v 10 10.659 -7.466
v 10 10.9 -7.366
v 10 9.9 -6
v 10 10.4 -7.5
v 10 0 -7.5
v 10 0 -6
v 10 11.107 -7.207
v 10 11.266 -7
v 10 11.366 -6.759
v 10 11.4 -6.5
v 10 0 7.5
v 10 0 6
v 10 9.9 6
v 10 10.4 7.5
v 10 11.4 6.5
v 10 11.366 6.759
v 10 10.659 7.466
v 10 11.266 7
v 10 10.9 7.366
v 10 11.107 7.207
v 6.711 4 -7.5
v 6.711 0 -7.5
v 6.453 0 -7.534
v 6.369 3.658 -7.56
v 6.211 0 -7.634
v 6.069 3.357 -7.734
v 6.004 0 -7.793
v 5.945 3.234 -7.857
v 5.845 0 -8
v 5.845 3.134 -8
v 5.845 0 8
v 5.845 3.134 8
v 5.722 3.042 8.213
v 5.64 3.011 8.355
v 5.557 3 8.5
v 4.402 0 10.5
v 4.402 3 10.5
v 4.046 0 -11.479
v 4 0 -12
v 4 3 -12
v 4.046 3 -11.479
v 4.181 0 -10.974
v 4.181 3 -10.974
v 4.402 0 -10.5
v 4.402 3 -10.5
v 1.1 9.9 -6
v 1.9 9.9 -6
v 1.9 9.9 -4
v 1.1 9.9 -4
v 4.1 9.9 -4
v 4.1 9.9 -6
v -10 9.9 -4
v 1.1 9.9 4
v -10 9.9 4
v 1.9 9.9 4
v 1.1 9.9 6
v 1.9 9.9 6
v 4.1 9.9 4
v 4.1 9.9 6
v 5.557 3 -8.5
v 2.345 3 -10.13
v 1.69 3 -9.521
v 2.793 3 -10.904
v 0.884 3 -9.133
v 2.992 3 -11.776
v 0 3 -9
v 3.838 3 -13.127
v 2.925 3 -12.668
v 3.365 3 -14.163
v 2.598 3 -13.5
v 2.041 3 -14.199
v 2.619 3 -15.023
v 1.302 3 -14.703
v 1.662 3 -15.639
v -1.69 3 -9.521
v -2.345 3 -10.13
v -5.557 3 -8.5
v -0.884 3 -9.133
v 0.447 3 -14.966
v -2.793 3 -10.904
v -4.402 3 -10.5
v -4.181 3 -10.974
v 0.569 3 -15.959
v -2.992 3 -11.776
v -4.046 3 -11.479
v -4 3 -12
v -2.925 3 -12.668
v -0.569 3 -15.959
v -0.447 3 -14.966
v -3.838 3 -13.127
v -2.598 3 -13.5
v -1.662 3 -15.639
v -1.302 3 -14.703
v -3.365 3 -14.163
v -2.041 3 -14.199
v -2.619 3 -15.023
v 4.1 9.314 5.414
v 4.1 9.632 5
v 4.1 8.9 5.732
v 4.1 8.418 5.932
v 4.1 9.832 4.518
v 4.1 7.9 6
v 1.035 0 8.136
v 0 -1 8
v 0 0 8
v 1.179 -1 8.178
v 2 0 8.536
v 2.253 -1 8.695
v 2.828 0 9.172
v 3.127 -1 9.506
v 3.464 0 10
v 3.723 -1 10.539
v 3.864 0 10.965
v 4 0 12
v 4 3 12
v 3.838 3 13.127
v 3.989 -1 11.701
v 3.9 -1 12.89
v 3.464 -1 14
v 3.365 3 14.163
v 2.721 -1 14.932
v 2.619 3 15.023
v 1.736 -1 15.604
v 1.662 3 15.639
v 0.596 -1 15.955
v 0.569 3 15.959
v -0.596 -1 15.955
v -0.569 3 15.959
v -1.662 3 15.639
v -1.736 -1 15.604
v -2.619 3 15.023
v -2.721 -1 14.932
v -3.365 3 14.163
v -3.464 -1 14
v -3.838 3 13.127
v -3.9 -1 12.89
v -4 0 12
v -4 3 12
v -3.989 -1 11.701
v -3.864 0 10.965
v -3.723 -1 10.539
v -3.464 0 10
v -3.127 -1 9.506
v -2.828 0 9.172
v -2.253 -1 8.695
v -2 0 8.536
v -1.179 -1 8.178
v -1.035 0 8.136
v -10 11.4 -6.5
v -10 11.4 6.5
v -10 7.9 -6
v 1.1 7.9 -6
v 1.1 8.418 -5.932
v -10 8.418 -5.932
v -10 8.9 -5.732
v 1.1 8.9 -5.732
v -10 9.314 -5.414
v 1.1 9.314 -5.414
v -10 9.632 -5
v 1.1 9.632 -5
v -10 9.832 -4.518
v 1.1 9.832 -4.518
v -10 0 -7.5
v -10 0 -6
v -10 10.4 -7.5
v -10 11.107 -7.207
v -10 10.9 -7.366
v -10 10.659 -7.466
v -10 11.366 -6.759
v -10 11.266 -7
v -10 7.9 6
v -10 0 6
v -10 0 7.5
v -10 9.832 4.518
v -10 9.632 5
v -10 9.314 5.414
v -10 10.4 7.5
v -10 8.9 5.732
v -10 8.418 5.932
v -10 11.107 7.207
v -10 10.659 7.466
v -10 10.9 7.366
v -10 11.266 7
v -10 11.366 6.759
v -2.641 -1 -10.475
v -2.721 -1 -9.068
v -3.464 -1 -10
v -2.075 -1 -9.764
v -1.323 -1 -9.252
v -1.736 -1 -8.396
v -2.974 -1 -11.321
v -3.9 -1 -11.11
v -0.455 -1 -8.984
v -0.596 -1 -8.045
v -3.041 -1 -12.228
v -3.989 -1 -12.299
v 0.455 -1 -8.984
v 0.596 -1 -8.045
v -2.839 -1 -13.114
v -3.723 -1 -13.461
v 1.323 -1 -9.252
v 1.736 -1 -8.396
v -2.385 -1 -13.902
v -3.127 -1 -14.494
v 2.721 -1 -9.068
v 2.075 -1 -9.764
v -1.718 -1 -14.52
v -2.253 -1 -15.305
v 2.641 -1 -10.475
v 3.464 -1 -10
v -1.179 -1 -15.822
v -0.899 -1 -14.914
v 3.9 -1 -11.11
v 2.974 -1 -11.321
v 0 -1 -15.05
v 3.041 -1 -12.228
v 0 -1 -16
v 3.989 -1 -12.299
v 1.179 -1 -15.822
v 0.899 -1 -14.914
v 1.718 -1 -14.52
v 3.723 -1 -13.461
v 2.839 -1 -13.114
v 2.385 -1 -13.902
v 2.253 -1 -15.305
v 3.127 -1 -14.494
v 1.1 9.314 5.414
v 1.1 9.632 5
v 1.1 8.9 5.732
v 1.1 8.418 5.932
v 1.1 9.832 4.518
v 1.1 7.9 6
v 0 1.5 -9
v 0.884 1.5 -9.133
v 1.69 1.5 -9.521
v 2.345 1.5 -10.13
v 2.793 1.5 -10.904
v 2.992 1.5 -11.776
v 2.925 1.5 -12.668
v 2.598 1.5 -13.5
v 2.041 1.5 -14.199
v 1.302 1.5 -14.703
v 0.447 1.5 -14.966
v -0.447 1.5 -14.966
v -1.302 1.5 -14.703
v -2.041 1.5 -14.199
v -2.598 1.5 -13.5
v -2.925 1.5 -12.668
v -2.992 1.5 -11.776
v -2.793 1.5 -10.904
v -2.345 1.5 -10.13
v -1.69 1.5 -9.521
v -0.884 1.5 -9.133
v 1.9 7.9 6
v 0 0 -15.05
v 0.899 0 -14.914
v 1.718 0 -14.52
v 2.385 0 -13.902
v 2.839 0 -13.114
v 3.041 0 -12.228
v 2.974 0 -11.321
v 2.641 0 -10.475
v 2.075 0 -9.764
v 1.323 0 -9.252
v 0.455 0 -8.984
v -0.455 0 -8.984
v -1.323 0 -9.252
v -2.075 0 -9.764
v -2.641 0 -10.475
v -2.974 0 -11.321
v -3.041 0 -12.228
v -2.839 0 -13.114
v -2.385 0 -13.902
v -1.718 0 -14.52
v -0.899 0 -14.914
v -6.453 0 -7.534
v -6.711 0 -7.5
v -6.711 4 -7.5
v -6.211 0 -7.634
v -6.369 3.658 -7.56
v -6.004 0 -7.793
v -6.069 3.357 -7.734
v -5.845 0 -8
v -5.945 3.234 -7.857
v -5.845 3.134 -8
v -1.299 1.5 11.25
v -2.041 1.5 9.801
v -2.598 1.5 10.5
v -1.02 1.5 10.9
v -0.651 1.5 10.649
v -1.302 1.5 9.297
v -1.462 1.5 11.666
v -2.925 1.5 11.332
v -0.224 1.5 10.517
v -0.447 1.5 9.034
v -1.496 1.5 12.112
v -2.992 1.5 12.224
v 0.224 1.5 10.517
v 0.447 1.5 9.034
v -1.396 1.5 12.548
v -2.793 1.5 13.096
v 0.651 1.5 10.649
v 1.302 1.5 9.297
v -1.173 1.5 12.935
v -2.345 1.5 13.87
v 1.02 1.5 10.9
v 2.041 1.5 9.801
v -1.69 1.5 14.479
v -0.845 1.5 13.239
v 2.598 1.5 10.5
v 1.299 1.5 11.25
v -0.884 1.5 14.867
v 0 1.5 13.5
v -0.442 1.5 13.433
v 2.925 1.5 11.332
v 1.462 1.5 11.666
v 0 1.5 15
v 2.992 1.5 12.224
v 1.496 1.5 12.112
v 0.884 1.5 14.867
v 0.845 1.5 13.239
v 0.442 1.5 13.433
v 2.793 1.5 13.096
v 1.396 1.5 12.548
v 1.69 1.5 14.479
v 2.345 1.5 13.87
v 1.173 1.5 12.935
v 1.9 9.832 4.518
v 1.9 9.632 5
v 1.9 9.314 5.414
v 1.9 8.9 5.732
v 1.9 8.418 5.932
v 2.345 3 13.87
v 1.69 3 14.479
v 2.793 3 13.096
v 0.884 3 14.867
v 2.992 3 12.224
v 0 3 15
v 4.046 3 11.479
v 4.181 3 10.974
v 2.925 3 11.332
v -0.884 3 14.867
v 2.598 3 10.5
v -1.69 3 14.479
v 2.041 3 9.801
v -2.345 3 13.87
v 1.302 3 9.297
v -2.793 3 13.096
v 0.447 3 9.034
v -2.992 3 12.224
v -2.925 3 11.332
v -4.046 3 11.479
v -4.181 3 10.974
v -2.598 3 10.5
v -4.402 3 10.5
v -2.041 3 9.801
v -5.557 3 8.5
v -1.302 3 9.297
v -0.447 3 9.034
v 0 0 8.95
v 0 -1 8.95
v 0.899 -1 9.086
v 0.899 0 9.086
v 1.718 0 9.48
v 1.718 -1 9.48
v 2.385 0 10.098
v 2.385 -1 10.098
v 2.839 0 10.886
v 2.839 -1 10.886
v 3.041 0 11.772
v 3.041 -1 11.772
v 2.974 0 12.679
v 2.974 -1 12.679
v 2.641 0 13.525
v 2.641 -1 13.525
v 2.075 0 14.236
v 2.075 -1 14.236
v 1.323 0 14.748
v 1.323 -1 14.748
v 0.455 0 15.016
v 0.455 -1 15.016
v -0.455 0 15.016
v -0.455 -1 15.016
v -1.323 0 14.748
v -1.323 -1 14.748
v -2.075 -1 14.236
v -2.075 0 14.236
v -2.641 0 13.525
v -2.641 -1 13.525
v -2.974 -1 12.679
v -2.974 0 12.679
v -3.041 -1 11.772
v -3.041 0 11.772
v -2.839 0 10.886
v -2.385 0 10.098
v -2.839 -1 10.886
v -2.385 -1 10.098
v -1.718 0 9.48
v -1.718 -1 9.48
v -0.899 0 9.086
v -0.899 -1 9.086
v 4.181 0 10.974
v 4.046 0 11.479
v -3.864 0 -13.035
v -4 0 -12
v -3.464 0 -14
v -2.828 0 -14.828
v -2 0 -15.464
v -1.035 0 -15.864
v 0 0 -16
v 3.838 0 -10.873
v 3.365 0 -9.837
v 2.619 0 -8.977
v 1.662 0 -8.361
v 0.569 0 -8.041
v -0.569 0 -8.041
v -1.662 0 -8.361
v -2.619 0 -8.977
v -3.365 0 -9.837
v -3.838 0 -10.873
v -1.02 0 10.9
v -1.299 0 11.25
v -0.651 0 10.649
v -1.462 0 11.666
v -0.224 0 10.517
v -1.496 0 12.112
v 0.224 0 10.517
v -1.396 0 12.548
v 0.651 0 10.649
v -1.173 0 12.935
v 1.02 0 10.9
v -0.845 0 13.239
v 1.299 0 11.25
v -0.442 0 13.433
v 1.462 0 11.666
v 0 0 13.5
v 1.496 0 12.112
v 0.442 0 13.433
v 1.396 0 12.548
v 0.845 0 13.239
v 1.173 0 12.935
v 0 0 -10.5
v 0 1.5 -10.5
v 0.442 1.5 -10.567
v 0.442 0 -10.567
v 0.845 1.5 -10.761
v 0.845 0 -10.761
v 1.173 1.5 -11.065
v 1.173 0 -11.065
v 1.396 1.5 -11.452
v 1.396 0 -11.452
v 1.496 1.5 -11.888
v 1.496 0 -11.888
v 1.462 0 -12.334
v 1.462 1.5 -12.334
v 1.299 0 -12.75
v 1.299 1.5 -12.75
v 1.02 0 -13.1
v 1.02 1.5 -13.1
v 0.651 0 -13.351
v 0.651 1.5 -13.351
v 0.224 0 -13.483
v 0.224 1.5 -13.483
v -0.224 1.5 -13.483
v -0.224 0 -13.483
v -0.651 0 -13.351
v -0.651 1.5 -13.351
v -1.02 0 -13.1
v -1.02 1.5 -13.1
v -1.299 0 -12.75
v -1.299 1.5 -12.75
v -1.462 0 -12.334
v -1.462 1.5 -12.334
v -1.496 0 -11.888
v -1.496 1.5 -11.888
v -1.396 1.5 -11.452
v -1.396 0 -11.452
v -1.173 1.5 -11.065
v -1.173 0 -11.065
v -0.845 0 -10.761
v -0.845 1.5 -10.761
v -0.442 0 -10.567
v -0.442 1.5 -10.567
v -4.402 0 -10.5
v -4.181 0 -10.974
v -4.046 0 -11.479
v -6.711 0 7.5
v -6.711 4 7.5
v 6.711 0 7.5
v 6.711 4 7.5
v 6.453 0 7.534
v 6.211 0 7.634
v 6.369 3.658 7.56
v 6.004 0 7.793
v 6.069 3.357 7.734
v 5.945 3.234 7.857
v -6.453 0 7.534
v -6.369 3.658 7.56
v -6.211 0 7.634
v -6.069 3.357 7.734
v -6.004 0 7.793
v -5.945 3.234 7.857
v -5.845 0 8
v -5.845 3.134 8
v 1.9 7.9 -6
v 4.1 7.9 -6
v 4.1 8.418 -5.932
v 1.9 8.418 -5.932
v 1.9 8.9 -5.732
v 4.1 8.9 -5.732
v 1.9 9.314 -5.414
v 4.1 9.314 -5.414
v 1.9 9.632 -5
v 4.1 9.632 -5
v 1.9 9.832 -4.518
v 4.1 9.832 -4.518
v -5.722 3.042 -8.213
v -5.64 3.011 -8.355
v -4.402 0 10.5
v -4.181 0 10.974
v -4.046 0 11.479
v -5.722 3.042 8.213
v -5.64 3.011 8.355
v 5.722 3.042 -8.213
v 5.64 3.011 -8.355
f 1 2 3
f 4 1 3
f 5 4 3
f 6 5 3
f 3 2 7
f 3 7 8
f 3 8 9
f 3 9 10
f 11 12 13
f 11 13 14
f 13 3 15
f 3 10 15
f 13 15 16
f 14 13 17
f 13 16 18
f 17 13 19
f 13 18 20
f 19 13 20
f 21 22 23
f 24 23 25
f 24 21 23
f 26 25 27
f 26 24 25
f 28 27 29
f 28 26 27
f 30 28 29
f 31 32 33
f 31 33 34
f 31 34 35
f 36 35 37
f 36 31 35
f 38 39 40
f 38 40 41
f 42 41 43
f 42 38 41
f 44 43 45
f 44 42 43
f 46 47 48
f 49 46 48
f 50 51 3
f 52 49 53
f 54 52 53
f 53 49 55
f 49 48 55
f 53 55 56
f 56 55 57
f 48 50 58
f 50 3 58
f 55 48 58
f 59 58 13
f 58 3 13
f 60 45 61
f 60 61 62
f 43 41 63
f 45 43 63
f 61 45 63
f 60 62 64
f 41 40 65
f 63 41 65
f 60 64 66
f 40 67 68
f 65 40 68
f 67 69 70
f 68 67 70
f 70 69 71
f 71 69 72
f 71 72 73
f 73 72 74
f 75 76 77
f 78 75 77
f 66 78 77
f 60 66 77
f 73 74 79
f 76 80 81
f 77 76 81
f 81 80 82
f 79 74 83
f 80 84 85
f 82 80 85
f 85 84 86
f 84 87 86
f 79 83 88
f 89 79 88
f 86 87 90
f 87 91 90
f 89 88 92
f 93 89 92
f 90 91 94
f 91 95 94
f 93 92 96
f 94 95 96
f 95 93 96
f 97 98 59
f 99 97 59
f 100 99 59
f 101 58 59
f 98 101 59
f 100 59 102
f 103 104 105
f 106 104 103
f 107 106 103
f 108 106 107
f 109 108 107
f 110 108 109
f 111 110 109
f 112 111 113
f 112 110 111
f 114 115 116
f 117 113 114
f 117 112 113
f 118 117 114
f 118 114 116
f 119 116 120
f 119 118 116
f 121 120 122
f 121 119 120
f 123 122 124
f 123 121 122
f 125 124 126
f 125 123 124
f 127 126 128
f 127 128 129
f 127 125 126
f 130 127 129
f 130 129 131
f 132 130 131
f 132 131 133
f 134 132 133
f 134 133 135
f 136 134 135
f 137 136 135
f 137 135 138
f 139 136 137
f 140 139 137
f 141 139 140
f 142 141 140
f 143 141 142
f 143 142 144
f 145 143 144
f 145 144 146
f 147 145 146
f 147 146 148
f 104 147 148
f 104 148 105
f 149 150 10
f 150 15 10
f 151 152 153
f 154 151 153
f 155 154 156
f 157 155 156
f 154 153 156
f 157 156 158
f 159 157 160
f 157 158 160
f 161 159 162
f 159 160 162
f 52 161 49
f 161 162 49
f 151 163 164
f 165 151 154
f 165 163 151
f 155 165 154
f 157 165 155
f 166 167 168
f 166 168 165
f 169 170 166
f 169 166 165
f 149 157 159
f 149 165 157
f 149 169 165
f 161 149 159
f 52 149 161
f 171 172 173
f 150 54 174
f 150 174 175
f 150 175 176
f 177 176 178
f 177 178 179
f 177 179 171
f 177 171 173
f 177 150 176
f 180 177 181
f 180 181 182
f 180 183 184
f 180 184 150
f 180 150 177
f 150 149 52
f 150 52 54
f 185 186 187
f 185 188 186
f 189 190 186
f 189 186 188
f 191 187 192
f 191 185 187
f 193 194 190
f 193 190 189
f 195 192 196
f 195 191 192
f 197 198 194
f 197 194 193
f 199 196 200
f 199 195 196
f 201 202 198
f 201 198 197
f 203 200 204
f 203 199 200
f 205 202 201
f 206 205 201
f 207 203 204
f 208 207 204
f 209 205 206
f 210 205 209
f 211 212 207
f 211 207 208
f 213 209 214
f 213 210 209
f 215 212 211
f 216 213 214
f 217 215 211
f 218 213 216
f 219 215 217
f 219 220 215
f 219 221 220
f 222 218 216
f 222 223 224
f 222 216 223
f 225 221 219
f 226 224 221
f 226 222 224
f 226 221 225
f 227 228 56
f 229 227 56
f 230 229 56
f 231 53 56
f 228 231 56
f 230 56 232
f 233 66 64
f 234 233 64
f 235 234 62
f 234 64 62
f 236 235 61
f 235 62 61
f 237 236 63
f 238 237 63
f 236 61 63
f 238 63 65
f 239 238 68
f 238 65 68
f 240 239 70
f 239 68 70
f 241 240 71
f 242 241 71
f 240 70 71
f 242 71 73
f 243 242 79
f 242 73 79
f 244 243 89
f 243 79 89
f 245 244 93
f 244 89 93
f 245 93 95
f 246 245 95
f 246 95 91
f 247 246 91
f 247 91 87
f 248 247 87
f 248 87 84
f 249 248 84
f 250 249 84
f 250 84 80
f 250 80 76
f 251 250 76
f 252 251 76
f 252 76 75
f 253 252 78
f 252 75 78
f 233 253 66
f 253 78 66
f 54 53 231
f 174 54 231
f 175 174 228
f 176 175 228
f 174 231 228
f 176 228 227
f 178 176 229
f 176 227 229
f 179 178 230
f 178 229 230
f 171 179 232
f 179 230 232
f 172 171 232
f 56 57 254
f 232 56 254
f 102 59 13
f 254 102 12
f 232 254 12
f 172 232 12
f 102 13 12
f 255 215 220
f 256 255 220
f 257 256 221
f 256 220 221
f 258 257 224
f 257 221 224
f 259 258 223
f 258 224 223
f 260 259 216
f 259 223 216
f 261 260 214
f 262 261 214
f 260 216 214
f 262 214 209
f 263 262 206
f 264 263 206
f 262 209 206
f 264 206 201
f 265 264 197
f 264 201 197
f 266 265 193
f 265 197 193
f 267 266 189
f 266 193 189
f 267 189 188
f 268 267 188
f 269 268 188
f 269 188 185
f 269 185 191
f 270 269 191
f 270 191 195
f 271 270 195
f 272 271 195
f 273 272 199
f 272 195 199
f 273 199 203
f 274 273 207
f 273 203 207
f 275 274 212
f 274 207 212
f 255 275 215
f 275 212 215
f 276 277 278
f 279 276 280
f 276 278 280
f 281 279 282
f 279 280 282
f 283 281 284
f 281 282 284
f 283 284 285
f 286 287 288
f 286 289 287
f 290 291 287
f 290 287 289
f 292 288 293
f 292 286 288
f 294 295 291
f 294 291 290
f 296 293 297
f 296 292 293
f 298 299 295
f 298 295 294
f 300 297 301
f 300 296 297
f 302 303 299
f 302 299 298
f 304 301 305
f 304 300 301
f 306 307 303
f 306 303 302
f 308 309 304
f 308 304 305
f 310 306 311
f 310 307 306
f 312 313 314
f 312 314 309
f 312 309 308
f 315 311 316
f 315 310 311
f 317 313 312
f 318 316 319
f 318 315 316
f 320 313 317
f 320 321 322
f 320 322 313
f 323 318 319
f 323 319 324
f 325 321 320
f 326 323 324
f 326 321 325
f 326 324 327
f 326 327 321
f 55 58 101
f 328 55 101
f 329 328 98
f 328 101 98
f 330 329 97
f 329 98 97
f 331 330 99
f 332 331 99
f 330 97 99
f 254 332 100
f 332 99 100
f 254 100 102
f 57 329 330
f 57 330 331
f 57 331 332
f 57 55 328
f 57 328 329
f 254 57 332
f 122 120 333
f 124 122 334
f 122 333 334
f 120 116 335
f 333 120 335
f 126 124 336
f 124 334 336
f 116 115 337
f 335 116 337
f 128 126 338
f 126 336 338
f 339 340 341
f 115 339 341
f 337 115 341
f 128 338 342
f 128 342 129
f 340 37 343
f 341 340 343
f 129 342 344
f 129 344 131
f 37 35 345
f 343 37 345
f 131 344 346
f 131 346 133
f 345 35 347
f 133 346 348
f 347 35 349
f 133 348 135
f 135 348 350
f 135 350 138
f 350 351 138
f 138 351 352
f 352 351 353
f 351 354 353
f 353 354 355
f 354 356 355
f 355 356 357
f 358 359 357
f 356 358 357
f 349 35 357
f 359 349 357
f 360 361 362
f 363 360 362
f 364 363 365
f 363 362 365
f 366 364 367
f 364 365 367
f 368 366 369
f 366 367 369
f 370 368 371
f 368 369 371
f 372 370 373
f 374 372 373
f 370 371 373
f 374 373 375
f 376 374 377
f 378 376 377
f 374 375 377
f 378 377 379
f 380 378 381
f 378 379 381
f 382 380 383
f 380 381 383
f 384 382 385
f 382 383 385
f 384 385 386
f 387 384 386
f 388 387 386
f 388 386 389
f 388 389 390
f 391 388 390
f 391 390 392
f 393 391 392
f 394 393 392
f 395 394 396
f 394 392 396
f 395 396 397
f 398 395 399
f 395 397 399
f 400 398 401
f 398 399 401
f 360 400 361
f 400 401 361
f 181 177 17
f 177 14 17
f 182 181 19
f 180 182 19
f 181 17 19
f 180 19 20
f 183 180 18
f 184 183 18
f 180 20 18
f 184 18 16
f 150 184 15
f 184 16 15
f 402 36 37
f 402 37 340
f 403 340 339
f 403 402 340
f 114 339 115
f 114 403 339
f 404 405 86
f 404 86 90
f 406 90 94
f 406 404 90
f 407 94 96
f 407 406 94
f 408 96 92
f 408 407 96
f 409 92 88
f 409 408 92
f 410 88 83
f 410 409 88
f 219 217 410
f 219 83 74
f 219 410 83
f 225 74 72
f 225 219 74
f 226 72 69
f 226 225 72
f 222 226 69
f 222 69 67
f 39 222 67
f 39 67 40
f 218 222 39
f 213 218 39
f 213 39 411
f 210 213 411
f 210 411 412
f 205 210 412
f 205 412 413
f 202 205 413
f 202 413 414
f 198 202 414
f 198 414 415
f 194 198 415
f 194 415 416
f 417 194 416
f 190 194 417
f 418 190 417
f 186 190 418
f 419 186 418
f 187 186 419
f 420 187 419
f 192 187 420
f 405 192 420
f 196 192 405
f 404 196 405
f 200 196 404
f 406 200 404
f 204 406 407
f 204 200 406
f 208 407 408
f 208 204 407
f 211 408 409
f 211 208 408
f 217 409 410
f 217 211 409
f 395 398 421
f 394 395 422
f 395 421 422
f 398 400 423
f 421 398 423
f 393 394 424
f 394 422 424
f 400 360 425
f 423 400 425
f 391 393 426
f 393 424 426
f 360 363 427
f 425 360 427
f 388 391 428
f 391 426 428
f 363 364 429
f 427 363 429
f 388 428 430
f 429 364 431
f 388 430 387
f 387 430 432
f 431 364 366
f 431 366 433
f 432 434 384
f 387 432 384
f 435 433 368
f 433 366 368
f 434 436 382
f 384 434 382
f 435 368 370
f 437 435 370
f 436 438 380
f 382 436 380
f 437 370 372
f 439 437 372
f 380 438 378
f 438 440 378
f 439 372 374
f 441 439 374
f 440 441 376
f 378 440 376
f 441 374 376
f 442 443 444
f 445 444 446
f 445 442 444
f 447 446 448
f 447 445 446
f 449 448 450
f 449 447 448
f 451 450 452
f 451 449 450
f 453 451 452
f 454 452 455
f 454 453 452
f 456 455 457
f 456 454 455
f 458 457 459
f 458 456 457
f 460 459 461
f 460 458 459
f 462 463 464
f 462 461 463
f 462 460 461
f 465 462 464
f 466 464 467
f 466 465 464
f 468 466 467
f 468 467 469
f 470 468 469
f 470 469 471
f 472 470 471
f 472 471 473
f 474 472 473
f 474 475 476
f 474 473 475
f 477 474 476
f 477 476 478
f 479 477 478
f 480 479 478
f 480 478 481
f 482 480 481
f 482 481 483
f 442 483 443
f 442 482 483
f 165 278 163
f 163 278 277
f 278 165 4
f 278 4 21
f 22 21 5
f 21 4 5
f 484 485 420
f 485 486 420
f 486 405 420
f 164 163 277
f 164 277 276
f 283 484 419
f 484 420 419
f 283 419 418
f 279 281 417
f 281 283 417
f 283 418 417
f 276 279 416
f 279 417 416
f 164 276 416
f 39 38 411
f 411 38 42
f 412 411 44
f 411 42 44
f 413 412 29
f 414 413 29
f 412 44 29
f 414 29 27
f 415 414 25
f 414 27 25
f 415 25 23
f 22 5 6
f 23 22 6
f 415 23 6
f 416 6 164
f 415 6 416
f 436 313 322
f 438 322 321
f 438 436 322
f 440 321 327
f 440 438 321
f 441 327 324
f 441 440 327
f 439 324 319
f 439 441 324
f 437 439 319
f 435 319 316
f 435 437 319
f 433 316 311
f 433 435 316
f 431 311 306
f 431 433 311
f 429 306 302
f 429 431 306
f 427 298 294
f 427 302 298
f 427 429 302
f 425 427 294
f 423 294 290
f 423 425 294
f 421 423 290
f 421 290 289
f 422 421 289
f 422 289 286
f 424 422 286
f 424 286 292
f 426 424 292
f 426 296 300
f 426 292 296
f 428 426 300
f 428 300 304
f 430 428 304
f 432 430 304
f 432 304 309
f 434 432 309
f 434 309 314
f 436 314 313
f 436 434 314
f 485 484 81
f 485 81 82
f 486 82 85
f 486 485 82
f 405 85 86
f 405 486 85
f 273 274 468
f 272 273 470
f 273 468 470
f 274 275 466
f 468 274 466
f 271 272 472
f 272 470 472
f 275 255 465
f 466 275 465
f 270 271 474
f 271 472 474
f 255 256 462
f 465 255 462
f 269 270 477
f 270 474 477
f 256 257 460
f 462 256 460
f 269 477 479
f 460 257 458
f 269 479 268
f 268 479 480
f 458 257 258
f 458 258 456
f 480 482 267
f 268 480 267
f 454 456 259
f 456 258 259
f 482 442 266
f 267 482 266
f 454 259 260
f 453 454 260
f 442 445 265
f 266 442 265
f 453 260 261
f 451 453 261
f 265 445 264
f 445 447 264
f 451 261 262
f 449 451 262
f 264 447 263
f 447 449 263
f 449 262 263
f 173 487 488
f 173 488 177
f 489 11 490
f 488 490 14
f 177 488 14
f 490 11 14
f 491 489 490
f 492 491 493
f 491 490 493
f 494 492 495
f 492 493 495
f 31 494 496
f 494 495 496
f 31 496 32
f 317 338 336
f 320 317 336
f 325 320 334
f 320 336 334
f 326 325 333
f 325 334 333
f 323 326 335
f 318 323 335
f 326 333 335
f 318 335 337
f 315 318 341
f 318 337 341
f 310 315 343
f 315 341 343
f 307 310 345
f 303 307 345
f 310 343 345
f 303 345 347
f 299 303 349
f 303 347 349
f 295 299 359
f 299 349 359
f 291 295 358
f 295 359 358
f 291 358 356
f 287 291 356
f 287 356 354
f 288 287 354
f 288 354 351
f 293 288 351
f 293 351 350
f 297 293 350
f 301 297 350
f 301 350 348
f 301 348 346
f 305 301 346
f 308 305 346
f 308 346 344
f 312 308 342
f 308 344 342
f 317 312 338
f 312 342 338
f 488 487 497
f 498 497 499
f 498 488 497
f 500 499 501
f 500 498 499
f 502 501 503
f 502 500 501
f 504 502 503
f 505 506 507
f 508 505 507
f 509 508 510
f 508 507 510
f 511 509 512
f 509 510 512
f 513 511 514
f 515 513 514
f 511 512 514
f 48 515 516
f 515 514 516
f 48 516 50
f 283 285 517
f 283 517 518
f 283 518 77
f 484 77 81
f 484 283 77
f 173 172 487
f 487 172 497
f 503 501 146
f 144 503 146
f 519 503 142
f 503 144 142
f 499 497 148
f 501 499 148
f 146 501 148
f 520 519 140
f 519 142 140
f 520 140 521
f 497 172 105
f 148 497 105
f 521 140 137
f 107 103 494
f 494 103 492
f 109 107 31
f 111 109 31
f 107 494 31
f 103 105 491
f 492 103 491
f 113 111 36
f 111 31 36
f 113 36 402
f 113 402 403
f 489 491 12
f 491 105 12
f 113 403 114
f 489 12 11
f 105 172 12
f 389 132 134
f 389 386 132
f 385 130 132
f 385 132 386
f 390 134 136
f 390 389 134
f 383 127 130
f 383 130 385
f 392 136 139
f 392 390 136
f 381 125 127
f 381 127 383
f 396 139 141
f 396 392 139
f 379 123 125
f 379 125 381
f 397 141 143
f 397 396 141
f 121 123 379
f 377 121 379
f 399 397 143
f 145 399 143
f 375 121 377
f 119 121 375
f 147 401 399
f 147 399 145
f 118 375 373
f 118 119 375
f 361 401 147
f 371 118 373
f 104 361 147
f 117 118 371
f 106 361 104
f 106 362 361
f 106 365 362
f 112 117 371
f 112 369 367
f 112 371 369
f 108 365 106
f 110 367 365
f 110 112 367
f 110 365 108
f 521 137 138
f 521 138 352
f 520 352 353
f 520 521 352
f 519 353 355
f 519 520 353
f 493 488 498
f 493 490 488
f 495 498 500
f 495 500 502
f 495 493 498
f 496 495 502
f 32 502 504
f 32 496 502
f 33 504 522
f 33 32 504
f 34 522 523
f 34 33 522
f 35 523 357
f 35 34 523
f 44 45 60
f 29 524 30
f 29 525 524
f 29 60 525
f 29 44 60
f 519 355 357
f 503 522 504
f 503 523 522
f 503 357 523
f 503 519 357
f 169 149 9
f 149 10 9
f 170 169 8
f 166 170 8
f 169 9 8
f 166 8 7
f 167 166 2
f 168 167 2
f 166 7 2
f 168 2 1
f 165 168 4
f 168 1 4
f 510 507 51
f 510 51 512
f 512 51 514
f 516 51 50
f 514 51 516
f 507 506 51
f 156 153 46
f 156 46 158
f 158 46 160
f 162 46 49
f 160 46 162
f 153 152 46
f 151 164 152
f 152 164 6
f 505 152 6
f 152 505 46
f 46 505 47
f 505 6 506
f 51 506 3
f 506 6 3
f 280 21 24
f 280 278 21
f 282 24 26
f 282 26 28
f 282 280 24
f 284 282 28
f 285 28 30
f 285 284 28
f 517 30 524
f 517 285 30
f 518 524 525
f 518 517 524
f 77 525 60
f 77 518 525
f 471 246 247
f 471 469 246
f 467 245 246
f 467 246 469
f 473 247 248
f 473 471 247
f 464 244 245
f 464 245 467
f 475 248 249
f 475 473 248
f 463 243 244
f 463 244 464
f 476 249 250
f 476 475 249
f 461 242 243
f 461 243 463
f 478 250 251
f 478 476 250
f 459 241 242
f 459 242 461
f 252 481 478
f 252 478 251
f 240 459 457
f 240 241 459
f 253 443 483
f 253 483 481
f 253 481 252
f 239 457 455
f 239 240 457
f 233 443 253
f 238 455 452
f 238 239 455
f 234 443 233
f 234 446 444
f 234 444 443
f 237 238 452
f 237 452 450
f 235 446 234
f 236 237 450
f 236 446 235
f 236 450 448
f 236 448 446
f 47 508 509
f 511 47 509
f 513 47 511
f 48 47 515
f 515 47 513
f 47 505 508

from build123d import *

# Parameters (mm, degrees)
BOSS_EXTRUDE1_DEPTH = 10
SKETCH2_W           = 0.8
SKETCH2_H           = 12
CUT_EXTRUDE1_DEPTH  = 10
SKETCH3_R           = 1.5
BOSS_EXTRUDE2_DEPTH = 3
FILLET1_R           = 1
SKETCH4_R           = 3
CUT_EXTRUDE2_DEPTH  = 1.5
BOSS_EXTRUDE3_START = 1
SKETCH6_R           = 4
SKETCH6_R_2         = 3.05
BOSS_EXTRUDE3_DEPTH = 1


with BuildPart() as part:
    # Sketch1 → Boss-Extrude1 (new, symmetric)
    with BuildSketch(Plane(origin=(0, 0, 0), x_dir=(0, 0, -1), z_dir=(1, 0, 0))):
        with BuildLine():
            Line((-6, 0), (-7.5, 0))
            Line((-7.5, 0), (-7.5, 10.4))
            ThreePointArc((-7.5, 10.4), (-7.207106781, 11.107106781), (-6.5, 11.4))
            Line((-6.5, 11.4), (6.5, 11.4))
            ThreePointArc((6.5, 11.4), (7.207106781, 11.107106781), (7.5, 10.4))
            Line((7.5, 10.4), (7.5, 0))
            Line((7.5, 0), (6, 0))
            Line((6, 0), (6, 7.9))
            ThreePointArc((6, 7.9), (5.414213562, 9.314213562), (4, 9.9))
            Line((4, 9.9), (-4, 9.9))
            ThreePointArc((-4, 9.9), (-5.414213562, 9.314213562), (-6, 7.9))
            Line((-6, 7.9), (-6, 0))
        make_face()
    extrude(amount=BOSS_EXTRUDE1_DEPTH, both=True)

    # Sketch2 → Cut-Extrude1 (cut)
    with BuildSketch(Plane.XZ.offset(-9.9)):
        Polygon((4.9, -6), (4.1, -6), (4.1, 6), (4.9, 6), (11.86883473, 6), (11.86883473, -6), align=None)
        with Locations((1.5, 0)):
            Rectangle(SKETCH2_W, SKETCH2_H)
    extrude(amount=CUT_EXTRUDE1_DEPTH, mode=Mode.SUBTRACT)

    # Sketch3 → Boss-Extrude2 (add)
    # profile 1 of 2: a face of its own
    with BuildSketch(Plane(origin=(0, 0, 0), x_dir=(1, 0, 0), z_dir=(0, 1, 0))):
        with BuildLine():
            Line((-6.133974596, 7.5), (-4.401923789, 10.5))
            ThreePointArc((-4.401923789, 10.5), (-4.102222521, 11.223542865), (-4, 12))
            ThreePointArc((-4, 12), (0, 16), (4, 12))
            ThreePointArc((4, 12), (4.102222521, 11.223542865), (4.401923789, 10.5))
            Line((4.401923789, 10.5), (6.133974596, 7.5))
            Line((6.133974596, 7.5), (-6.133974596, 7.5))
        make_face()
        with Locations(Location((0, 12, 0), (0, 0, 270))):
            Circle(SKETCH3_R, mode=Mode.SUBTRACT)
    # profile 2 of 2: a face of its own
    with BuildSketch(Plane(origin=(0, 0, 0), x_dir=(1, 0, 0), z_dir=(0, 1, 0))):
        with BuildLine():
            Line((6.133974596, -7.5), (4.401923789, -10.5))
            ThreePointArc((4.401923789, -10.5), (4.102222521, -11.223542865), (4, -12))
            ThreePointArc((4, -12), (0, -16), (-4, -12))
            ThreePointArc((-4, -12), (-4.102222521, -11.223542865), (-4.401923789, -10.5))
            Line((-4.401923789, -10.5), (-6.133974596, -7.5))
            Line((-6.133974596, -7.5), (6.133974596, -7.5))
        make_face()
        with Locations(Location((0, -12, 0), (0, 0, 270))):
            Circle(SKETCH3_R, mode=Mode.SUBTRACT)
    extrude(amount=BOSS_EXTRUDE2_DEPTH)

    # Fillet1
    fillet1_edges = [part.edges().sort_by_distance(p)[0] for p in [
        (0, 3, 7.5),
        (6.133974596, 1.5, 7.5),
        (-6.133974596, 1.5, 7.5),
        (0, 3, -7.5),
        (-6.133974596, 1.5, -7.5),
        (6.133974596, 1.5, -7.5),
    ]]
    fillet(fillet1_edges, radius=FILLET1_R)

    # Sketch4 → Cut-Extrude2 (cut)
    with BuildSketch(Plane(origin=(0, 3, 0), x_dir=(1, 0, 0), z_dir=(0, 1, 0))):
        with Locations(Location((0, -12, 0), (0, 0, 270))):
            Circle(SKETCH4_R)
        with Locations(Location((0, 12, 0), (0, 0, 270))):
            Circle(SKETCH4_R)
    extrude(amount=-CUT_EXTRUDE2_DEPTH, mode=Mode.SUBTRACT)

    # Sketch6 → Boss-Extrude3 (add)
    # profile 1 of 2: a face of its own
    with BuildSketch(Plane.XZ.offset(BOSS_EXTRUDE3_START)):
        with Locations(Location((0, 12, 0), (0, 0, 270))):
            Circle(SKETCH6_R)
        with Locations(Location((0, 12, 0), (0, 0, 270))):
            Circle(SKETCH6_R_2, mode=Mode.SUBTRACT)
    # profile 2 of 2: a face of its own
    with BuildSketch(Plane.XZ.offset(BOSS_EXTRUDE3_START)):
        with Locations(Location((0, -12, 0), (0, 0, 270))):
            Circle(SKETCH6_R)
        with Locations(Location((0, -12, 0), (0, 0, 270))):
            Circle(SKETCH6_R_2, mode=Mode.SUBTRACT)
    extrude(amount=-BOSS_EXTRUDE3_DEPTH)


solid = part.part
